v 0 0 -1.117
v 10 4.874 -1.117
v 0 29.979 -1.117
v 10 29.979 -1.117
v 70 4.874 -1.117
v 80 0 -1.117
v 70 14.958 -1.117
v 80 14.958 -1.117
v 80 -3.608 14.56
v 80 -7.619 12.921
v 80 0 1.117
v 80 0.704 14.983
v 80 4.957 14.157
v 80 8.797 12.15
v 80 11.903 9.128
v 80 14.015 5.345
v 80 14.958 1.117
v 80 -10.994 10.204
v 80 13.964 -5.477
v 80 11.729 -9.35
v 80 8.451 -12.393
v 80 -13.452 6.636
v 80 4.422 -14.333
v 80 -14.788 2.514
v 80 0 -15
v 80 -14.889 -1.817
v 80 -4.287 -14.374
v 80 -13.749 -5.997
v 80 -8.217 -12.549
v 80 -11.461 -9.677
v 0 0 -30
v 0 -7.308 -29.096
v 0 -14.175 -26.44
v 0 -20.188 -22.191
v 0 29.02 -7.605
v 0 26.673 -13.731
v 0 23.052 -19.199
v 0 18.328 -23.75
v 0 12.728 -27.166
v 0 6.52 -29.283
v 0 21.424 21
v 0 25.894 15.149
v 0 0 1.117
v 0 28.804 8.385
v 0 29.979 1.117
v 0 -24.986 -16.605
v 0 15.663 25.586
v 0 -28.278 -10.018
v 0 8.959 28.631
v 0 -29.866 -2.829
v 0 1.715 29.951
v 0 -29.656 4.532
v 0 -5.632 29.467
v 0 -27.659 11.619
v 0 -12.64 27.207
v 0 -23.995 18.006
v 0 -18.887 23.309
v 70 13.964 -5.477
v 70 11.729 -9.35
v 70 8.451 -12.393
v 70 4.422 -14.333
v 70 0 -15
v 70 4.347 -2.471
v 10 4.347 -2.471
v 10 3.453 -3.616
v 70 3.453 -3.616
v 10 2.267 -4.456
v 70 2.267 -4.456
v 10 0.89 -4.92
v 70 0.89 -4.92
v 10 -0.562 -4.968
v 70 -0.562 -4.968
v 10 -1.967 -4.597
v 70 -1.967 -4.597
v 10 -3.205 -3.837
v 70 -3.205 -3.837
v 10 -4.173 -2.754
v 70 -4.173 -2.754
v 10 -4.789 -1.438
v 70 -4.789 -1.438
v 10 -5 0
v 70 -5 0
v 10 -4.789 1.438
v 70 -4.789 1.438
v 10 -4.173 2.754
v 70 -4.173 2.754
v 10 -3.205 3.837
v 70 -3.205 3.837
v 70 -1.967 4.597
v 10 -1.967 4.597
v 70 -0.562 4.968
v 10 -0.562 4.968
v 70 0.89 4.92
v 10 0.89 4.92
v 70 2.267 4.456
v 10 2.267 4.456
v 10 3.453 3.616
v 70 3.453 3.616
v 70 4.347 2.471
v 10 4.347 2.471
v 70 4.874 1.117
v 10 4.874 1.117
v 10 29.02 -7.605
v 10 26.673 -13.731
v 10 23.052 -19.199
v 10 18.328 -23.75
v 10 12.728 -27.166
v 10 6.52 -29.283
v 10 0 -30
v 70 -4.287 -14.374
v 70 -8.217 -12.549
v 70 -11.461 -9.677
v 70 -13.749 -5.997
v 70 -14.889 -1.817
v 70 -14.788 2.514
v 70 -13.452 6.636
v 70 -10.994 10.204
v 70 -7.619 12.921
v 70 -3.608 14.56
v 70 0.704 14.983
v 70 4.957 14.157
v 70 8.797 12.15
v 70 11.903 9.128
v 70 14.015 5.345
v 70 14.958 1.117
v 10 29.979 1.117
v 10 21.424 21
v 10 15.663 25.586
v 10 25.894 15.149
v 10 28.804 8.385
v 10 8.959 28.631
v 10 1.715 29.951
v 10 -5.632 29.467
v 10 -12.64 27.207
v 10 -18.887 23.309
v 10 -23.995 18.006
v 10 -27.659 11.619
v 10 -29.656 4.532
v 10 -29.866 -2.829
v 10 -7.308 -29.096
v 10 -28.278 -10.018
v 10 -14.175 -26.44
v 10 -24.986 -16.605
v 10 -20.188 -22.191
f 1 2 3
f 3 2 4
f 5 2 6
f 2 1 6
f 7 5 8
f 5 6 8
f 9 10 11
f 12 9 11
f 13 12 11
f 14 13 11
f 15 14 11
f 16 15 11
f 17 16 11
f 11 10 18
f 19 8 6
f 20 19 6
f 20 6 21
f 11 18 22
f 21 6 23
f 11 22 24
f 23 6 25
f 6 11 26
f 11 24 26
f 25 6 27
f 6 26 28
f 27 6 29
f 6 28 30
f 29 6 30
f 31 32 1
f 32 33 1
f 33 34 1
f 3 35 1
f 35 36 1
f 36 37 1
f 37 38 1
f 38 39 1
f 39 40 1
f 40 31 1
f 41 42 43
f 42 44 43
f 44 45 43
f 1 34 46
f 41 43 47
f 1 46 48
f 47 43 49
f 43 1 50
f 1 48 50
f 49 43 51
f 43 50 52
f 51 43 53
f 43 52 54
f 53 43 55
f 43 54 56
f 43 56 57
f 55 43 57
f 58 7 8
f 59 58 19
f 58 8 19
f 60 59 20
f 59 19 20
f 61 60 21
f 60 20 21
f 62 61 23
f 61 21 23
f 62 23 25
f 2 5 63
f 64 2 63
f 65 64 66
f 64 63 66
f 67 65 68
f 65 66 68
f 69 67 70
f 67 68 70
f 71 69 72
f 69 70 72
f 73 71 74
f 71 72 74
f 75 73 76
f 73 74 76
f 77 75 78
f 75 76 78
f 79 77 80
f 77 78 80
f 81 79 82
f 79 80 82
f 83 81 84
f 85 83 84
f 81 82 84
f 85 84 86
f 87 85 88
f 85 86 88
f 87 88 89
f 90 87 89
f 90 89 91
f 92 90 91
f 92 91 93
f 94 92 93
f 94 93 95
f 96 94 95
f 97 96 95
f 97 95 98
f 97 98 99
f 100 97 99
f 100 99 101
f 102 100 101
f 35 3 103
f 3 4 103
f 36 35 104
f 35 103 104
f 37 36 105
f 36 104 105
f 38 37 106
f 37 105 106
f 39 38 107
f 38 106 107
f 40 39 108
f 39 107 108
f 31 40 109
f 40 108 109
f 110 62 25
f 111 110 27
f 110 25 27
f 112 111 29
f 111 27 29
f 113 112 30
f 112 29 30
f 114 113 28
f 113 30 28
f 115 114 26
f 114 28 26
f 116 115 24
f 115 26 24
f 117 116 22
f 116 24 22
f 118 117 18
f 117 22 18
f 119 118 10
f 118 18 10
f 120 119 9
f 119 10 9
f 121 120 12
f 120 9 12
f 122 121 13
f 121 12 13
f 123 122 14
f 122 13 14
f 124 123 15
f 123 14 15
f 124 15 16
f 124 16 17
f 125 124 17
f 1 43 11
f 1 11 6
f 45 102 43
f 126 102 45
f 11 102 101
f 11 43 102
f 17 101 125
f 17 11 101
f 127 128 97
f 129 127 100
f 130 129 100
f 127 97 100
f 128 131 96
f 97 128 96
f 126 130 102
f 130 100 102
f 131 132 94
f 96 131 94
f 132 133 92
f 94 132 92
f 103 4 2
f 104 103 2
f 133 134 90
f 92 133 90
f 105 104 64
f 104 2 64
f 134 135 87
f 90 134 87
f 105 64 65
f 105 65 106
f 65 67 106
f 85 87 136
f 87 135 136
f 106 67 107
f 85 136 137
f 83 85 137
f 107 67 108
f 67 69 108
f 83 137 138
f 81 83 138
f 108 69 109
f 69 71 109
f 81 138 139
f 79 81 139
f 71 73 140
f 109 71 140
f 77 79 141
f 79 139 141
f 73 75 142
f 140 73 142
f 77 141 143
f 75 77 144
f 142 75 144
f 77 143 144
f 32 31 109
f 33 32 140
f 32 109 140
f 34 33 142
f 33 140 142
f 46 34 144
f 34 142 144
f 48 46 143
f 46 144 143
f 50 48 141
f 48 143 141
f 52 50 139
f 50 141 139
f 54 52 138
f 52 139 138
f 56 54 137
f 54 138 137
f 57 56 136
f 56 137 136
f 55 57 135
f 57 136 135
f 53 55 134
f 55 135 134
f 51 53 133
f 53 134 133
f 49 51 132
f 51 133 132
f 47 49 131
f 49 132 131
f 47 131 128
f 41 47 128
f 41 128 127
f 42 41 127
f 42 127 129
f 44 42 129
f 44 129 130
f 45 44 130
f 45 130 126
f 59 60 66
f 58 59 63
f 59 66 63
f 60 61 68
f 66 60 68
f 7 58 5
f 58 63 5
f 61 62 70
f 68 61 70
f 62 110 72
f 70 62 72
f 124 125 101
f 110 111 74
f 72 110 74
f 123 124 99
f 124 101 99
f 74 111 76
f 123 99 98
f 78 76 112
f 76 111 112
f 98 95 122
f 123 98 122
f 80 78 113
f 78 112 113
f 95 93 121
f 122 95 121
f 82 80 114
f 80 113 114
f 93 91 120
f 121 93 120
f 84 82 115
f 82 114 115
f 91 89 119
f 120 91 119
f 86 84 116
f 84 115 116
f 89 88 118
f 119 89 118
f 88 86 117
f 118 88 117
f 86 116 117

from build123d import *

# Parameters (mm, degrees)
SKETCH2_W          = 2.233127964
SKETCH2_H          = 31.607349632
CUT_EXTRUDE1_DEPTH = 80


with BuildPart() as part:
    # Sketch1 → Revolve1 (revolve)
    with BuildSketch(Plane.XY, mode=Mode.PRIVATE) as revolve1_sk:
        Polygon((0, 0), (0, 30), (10, 30), (10, 5), (70, 5), (70, 15), (80, 15), (80, 0), align=None)
    revolve(revolve1_sk.sketch.rotate(Axis((80, 0, 0), (-1, 0, 0)), 90), axis=Axis((80, 0, 0), (-1, 0, 0)))

    # Sketch2 → Cut-Extrude1 (cut)
    with BuildSketch(Plane(origin=(80, 0, 0), x_dir=(0, 0, -1), z_dir=(1, 0, 0))):
        with Locations((0, 15.803674816)):
            Rectangle(SKETCH2_W, SKETCH2_H)
    extrude(amount=-CUT_EXTRUDE1_DEPTH, mode=Mode.SUBTRACT)


solid = part.part
